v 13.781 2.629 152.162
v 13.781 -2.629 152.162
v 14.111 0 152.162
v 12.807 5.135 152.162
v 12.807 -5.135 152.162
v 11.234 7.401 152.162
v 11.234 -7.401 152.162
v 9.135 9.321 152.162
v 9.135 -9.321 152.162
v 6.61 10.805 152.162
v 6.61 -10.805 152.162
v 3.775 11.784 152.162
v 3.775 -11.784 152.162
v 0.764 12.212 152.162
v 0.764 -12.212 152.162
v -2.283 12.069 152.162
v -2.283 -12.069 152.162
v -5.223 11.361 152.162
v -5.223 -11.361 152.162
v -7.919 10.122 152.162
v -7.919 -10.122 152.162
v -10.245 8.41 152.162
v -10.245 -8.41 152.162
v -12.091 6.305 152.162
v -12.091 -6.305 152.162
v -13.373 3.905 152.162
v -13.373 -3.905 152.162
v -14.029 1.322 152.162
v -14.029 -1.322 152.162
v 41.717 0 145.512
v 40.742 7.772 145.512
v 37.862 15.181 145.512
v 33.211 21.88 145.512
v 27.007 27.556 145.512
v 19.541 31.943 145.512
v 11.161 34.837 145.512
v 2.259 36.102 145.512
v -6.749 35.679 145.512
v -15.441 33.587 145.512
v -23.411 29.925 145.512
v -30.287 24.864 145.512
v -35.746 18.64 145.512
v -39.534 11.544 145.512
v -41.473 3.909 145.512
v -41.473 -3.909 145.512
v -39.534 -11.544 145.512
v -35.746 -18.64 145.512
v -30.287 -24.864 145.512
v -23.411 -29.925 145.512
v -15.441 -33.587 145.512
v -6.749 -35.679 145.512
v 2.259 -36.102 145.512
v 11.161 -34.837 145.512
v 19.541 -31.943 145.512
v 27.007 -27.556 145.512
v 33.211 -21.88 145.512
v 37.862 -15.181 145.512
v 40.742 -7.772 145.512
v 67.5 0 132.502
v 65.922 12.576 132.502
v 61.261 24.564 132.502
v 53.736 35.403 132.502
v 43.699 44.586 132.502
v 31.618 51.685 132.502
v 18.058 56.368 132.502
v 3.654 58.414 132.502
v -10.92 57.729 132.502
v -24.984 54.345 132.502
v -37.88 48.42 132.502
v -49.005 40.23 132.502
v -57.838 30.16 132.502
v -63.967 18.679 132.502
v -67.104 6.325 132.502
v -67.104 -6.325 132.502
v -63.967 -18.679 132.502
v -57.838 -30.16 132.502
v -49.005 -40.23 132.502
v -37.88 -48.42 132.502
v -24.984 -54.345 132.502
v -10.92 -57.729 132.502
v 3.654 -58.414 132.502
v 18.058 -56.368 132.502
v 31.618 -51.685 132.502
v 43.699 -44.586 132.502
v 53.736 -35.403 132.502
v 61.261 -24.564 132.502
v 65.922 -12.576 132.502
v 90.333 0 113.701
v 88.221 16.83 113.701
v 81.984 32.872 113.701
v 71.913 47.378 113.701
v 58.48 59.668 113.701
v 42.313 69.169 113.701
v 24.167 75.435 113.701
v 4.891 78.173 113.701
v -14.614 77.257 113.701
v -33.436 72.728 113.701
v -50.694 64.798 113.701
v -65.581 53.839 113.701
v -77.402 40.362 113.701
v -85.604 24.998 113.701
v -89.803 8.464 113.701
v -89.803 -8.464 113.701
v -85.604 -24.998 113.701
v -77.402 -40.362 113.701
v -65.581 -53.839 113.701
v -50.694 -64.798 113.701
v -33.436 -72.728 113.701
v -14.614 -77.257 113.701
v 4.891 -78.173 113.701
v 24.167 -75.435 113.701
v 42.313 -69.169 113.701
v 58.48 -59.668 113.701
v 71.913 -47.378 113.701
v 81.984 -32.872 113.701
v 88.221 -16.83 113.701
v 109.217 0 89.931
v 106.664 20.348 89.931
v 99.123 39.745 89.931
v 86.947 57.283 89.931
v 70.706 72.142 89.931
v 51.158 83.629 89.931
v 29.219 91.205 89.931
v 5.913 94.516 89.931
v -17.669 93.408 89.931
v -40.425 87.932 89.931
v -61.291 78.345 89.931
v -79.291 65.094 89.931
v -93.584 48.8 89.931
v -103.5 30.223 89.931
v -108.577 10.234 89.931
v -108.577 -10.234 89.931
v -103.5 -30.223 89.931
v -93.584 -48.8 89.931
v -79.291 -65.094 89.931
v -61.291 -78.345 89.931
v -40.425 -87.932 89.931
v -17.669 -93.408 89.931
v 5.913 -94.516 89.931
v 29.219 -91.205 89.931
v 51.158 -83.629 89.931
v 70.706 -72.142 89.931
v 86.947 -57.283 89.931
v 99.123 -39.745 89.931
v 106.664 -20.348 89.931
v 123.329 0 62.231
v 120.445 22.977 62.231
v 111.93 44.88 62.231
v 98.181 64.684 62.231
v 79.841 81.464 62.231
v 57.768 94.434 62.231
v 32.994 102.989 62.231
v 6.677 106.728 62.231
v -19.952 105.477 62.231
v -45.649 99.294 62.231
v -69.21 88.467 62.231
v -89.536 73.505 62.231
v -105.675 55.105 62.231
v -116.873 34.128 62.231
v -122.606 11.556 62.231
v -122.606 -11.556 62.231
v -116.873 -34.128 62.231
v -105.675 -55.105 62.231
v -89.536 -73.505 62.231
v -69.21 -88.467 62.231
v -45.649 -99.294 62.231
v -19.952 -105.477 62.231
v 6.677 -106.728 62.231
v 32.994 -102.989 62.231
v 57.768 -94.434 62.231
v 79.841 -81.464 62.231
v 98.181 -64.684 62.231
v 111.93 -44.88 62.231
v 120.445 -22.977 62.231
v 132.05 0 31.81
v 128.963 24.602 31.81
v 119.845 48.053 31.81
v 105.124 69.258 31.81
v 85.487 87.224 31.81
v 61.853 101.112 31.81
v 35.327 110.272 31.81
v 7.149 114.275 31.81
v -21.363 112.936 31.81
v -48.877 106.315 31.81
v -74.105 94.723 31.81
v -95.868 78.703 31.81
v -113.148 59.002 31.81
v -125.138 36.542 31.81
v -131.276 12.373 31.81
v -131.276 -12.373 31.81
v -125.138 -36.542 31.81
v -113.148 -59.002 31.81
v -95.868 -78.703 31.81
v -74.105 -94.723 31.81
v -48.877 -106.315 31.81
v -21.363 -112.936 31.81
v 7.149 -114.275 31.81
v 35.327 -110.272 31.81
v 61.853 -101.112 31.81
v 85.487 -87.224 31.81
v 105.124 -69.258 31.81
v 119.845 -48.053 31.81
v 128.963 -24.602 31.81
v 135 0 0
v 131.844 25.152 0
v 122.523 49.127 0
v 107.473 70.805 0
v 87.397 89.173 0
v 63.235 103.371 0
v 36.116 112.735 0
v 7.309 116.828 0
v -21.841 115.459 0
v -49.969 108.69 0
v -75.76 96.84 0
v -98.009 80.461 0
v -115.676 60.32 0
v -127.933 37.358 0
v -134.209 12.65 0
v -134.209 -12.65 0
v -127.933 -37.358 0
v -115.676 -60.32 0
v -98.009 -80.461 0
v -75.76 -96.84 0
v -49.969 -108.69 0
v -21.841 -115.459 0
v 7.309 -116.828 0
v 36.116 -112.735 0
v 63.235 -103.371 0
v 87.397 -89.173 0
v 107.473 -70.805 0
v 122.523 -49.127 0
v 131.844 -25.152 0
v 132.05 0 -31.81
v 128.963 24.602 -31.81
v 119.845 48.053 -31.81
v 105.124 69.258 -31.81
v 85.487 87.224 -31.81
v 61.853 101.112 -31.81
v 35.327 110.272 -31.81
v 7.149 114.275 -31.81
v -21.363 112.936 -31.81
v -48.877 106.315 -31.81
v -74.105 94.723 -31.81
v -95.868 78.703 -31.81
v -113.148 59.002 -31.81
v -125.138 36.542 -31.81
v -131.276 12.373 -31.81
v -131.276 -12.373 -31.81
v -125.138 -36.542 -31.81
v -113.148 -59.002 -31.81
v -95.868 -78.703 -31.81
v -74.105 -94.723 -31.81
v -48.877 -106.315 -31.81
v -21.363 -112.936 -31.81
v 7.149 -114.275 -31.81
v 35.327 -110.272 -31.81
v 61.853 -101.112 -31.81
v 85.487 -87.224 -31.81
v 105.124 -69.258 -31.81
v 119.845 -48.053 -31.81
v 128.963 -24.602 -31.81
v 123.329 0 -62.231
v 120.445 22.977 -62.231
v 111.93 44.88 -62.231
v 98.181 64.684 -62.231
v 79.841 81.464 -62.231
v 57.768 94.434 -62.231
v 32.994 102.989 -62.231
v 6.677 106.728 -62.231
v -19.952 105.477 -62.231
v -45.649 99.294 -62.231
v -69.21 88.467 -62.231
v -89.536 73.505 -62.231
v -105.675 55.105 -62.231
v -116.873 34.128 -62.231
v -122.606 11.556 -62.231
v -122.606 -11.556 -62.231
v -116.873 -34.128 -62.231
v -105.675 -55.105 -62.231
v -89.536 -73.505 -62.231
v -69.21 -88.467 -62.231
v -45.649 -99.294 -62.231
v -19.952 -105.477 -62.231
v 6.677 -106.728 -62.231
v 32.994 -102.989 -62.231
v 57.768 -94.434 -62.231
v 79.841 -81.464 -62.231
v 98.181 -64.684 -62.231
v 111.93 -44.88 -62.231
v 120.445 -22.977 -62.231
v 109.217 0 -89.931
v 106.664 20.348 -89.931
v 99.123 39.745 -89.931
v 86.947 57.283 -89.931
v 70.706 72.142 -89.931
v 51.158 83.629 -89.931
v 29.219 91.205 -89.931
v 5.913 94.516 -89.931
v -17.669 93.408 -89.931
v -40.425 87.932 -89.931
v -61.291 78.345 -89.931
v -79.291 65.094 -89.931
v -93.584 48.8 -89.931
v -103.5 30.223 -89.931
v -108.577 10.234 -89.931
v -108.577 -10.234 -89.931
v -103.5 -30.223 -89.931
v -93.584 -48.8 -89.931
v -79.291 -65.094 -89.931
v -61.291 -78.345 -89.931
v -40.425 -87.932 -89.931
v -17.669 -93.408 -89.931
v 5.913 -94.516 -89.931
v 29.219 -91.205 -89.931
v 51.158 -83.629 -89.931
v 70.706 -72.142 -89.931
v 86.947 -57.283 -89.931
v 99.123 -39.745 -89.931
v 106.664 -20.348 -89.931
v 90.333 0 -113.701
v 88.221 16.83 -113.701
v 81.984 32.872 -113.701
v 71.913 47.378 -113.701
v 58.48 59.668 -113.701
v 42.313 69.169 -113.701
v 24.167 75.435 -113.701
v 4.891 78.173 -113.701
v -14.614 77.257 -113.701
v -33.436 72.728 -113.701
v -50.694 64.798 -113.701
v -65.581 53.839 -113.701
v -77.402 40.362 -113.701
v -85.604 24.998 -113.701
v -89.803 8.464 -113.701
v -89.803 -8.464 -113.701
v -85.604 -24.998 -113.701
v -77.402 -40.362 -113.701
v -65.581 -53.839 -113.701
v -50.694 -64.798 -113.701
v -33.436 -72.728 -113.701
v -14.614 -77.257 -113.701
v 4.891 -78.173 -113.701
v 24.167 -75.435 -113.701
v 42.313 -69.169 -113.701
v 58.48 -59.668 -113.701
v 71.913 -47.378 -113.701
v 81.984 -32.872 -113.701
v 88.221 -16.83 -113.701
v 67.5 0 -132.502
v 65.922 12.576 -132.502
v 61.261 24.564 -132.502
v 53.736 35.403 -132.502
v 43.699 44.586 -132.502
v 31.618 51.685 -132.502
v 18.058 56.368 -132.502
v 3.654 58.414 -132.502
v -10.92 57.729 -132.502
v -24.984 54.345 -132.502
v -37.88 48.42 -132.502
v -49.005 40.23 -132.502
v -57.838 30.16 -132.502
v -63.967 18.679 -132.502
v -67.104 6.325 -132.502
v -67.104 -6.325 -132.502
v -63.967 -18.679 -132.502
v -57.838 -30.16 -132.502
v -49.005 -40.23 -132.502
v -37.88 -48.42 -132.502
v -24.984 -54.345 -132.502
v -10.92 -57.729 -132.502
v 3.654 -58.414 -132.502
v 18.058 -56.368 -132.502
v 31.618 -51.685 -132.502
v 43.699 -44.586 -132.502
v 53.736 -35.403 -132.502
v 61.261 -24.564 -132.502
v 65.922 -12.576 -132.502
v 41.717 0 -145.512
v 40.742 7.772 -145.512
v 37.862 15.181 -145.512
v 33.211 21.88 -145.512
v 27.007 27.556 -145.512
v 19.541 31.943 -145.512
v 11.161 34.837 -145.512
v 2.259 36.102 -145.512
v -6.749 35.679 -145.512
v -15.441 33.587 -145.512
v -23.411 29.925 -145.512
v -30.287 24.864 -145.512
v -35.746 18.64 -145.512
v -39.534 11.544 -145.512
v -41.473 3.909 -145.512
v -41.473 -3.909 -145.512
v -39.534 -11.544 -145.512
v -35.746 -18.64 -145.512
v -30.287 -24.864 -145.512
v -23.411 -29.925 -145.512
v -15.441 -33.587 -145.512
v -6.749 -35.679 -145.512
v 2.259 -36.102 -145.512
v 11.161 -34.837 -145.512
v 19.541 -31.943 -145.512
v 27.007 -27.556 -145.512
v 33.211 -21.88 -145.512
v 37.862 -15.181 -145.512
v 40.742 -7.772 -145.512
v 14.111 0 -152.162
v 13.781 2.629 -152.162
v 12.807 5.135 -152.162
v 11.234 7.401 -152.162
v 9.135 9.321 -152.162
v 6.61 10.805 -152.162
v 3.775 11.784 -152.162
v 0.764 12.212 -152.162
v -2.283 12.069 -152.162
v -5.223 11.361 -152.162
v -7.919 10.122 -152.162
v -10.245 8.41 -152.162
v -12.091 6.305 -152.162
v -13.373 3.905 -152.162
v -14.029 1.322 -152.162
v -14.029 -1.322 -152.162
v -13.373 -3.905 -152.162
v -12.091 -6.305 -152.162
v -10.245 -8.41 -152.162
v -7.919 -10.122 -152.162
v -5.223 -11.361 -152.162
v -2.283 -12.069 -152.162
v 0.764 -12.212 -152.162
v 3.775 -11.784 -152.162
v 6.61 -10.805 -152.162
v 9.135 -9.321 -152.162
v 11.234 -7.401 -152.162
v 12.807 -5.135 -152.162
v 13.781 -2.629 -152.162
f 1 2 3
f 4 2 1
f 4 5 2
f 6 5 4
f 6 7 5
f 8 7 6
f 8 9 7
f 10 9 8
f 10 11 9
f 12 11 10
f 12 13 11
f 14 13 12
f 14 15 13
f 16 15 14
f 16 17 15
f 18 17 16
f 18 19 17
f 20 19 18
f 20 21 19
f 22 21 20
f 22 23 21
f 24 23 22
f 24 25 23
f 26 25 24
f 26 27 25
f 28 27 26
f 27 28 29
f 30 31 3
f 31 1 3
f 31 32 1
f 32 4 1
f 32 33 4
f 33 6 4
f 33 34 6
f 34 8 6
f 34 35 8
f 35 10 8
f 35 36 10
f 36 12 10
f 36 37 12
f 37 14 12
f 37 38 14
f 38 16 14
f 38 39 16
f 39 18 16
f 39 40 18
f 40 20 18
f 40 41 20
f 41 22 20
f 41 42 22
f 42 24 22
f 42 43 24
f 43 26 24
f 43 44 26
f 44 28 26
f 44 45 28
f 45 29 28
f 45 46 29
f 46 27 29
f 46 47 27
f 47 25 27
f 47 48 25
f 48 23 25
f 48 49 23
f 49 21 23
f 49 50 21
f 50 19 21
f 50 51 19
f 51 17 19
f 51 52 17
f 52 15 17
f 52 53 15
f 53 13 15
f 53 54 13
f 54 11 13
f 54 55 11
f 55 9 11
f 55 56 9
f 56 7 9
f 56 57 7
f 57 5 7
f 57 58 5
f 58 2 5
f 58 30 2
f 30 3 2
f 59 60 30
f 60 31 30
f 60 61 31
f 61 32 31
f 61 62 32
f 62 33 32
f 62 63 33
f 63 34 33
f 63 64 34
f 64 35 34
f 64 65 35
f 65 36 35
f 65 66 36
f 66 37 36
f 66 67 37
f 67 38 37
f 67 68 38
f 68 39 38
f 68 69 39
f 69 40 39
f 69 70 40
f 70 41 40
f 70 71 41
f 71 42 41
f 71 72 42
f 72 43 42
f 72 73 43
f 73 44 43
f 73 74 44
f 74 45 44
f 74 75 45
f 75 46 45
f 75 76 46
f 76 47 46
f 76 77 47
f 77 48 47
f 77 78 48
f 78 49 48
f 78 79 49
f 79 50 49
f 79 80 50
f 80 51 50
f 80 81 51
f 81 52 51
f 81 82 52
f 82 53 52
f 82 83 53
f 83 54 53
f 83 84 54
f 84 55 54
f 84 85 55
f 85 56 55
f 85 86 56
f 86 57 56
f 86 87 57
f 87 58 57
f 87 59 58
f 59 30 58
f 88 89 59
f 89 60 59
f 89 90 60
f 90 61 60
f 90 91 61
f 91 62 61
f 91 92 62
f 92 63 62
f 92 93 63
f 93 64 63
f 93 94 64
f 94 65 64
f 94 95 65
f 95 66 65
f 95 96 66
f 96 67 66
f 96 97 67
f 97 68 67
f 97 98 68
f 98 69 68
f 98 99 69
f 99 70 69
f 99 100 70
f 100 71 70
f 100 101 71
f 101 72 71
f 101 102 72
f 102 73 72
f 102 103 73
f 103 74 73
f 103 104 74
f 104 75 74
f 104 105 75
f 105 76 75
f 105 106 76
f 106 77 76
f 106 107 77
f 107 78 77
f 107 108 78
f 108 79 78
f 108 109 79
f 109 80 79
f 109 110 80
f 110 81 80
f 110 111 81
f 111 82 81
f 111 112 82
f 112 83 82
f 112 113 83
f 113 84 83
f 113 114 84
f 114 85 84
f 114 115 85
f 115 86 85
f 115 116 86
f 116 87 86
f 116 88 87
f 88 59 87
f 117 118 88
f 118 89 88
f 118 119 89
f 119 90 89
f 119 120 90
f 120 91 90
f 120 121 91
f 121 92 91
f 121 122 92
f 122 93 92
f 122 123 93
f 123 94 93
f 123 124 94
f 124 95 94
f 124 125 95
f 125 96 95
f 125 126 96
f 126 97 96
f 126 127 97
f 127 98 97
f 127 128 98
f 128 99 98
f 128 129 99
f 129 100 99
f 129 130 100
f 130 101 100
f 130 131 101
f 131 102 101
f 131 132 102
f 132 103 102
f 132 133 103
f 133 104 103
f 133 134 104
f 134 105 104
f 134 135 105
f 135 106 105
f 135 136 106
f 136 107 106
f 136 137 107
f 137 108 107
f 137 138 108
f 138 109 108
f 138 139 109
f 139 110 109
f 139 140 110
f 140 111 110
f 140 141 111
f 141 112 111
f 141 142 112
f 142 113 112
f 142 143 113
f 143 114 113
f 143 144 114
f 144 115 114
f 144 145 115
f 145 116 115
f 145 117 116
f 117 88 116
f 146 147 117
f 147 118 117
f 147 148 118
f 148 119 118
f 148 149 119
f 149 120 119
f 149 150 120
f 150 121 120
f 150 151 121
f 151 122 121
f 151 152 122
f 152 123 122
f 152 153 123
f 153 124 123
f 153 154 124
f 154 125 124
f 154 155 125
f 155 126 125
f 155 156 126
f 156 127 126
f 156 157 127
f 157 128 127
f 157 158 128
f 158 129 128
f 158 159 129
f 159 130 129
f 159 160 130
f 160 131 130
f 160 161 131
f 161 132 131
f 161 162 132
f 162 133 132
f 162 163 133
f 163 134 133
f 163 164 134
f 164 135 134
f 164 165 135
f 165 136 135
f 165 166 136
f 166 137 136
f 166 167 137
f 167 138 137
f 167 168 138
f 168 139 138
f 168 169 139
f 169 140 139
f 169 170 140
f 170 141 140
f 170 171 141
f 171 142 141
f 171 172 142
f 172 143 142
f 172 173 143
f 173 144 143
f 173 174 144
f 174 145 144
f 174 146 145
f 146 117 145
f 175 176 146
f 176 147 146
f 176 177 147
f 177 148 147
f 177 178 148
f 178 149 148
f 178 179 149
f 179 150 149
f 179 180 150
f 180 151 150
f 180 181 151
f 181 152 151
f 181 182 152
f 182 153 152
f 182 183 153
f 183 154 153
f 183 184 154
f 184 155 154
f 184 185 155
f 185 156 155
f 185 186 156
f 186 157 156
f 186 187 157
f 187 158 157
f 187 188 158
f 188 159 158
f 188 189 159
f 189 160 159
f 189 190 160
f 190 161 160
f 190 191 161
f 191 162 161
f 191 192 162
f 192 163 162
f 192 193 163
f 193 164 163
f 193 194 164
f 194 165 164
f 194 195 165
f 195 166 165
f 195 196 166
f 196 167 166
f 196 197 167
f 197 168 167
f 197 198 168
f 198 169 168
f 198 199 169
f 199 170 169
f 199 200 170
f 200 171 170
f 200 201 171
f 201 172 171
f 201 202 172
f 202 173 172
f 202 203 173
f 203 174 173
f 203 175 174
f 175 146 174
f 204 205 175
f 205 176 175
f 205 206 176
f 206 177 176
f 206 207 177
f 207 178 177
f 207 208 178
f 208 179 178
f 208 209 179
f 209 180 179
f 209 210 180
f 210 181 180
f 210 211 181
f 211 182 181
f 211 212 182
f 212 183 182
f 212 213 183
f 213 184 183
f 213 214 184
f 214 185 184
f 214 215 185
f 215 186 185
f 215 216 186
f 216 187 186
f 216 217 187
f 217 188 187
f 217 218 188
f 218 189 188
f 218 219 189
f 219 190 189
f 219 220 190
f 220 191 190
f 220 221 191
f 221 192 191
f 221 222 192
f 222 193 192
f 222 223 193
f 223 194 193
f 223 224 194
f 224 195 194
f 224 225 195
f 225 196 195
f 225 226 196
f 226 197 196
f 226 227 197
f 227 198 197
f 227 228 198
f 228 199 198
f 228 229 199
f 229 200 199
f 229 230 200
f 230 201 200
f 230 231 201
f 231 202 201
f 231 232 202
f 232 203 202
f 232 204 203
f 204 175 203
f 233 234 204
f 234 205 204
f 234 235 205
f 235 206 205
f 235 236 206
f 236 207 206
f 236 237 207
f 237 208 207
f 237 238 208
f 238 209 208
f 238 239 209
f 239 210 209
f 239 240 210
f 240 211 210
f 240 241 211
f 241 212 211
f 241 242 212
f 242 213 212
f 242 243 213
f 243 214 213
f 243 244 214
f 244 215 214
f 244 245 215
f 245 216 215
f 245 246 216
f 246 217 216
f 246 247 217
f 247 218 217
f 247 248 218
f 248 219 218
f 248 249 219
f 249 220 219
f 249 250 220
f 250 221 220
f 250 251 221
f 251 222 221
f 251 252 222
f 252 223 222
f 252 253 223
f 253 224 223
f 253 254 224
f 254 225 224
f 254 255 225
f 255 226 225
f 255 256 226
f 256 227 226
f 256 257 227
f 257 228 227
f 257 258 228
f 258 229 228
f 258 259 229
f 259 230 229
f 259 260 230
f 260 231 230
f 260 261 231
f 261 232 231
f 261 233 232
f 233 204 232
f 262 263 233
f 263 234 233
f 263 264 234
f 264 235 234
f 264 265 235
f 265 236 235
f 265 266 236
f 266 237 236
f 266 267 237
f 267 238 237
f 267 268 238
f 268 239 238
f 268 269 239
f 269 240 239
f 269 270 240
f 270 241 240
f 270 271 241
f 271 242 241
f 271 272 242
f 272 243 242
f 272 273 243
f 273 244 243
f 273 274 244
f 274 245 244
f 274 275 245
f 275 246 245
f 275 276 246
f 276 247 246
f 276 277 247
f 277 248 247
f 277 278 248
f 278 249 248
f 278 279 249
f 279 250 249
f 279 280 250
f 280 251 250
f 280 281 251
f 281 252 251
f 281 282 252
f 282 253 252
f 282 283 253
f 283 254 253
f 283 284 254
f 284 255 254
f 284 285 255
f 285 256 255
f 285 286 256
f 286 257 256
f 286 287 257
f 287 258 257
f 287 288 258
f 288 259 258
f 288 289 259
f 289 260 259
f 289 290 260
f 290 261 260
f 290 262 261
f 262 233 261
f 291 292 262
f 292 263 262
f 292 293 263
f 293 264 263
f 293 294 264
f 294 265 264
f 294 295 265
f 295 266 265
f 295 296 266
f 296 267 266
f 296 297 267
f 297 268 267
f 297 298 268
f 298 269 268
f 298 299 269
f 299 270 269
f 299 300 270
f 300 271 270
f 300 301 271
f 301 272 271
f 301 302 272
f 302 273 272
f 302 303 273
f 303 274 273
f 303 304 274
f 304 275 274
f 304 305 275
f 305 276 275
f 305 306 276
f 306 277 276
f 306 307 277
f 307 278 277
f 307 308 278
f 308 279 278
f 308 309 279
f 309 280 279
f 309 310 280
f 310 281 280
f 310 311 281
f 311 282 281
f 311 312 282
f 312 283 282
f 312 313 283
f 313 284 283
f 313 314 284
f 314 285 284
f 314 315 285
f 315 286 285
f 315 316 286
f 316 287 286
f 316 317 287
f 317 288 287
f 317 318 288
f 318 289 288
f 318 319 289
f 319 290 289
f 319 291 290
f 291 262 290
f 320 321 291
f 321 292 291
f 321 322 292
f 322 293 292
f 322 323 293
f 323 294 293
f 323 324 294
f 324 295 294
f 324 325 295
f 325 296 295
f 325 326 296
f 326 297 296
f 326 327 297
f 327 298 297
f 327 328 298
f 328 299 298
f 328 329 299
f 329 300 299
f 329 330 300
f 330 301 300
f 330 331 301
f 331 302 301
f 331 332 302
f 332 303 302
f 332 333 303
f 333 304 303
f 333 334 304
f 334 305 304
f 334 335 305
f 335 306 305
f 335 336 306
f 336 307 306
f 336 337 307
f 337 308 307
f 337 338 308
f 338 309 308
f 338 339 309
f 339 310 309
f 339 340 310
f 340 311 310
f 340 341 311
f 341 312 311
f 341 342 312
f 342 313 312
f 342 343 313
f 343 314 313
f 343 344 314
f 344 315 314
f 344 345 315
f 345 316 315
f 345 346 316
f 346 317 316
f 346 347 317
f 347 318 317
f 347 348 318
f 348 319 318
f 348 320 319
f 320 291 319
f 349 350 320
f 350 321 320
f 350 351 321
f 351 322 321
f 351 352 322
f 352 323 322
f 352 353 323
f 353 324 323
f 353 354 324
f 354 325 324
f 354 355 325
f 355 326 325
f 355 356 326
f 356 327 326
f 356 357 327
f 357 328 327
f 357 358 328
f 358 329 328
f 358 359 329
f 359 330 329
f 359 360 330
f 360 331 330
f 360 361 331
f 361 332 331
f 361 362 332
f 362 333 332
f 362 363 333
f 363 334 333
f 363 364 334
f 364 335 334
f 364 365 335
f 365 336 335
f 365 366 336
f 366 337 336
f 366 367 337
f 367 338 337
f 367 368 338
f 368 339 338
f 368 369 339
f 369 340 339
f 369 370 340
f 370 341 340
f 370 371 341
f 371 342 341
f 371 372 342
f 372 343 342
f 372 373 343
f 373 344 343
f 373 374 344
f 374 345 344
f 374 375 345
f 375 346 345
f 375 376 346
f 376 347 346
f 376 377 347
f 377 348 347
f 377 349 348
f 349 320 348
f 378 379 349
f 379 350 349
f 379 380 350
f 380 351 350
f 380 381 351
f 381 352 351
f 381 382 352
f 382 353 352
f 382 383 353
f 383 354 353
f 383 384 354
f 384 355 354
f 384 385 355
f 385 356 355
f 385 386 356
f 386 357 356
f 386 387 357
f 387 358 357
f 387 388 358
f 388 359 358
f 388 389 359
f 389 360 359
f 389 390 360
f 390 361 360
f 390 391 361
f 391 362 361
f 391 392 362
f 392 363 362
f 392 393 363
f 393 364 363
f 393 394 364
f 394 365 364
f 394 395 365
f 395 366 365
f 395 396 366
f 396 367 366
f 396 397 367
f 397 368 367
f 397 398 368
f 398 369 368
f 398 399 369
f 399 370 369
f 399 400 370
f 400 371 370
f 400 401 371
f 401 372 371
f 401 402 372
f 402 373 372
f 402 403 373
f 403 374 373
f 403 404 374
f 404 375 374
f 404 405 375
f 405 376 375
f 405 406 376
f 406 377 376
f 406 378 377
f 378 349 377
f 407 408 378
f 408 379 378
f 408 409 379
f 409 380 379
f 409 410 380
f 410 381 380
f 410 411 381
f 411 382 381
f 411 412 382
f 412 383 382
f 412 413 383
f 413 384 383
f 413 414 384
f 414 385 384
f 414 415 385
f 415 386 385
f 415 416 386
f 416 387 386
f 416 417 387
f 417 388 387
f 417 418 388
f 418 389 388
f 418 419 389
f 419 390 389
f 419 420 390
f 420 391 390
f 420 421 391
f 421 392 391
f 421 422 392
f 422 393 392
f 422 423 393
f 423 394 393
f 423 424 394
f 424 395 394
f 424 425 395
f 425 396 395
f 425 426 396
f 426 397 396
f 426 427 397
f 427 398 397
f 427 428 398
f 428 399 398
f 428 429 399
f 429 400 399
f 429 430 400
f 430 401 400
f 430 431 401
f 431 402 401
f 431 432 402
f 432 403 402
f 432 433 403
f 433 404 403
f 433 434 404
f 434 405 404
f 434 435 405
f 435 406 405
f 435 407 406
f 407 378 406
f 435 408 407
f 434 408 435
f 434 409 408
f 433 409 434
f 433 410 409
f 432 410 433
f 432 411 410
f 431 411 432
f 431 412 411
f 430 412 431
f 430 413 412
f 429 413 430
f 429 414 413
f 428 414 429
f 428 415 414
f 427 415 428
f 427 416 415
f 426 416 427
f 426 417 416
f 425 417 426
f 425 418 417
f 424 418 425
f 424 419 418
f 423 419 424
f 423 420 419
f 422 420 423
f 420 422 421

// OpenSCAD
// Generated by SolidPython 1.0.1 on 2020-07-29 00:46:52


scale(v = [15, 13, 17]) {
	sphere(r = 9);
}
/***********************************************
*********      SolidPython code:      **********
************************************************
 
# import packages: SolidPython
from solid import *
from solid.utils import *
from itertools import chain, combinations, permutations


class Resize:

    def __init__(self, scad_file):
        self.scad_file = scad_file
        #self.scad_file = import_scad(scad_file)
        # cone/cylinder param:
        self.r1 = 0
        self.r2 = 0
        self.h = 0
        # rectangular prism param:
        self.w = 0
        self.l = 0
        # ellipse param:
        self.r = 0

    # import OpenScad code (file name corresponds to shape)


    # classify shape + parameters
    def assign(self, param1, param2, param3):
        if self.scad_file == 'cone.scad':
            self.r1 = param1
            self.r2 = param2
            self.h = param3
        elif self.scad_file == 'cylinder.scad':
            self.r1 = param1
            self.r2 = param2
            self.h = param3
        elif self.scad_file == 'rectangularPrism.scad':
            self.h = param1
            self.l = param2
            self.w = param3
        else:
            self.r = param1
            self.h = param2

    # resize parameters
    def iterate(self):
        x = range(3, 20, 2)
        i = 1
        if self.scad_file == 'cone.scad':
            tempList = list(permutations(x, 2))
            for temp in tempList:
                param1 = temp[0]
                param2 = temp[1]
                filepath = 'produced_scad_files/' + 'cone' + str(param1) + '_' + str(param2) + '_' + '.scad'
                scad_render_to_file(cylinder(h=param1, r1=param2, r2=0), filepath)

        elif self.scad_file == 'cylinder.scad':
            tempList = list(permutations(x, 3))
            for temp in tempList:
                param1 = temp[0]
                param2 = temp[1]
                filepath = 'produced_scad_files/' + 'cylinder' + str(param1) + '_' + str(param2) + '_' + '.scad'
                scad_render_to_file(cylinder(h=param1, r1=param2, r2=param2), filepath)

        elif self.scad_file == 'rectangularPrism.scad':
            tempList = list(permutations(x, 3))
            for temp in tempList:
                param1 = temp[0]
                param2 = temp[1]
                param3 = temp[2]
                filepath = 'produced_scad_files/' + 'rectangularPrism' + str(param1) + '_' + str(param2) + '_' + str(
                    param3) + '.scad'
                scad_render_to_file(cube(size=(param1, param2, param3)), filepath)

        elif self.scad_file == 'ellipse.scad':
            tempList = list(permutations(x, 4))
            for temp in tempList:
                param1 = temp[0]
                param2 = temp[1]
                param3 = temp[2]
                param4 = temp[3]
                filepath = 'produced_scad_files/' + 'ellipse' + str(param1) + '_' + str(param2) + '_' + str(param3) + '_' + str(param4) + '.scad'
                scad_render_to_file(scale([param1, param2, param3])(sphere(r=param4)), filepath)

    def render_to_scadfile(self):
        scad_render_to_file(scad, 'example.scad') 
 
************************************************/
